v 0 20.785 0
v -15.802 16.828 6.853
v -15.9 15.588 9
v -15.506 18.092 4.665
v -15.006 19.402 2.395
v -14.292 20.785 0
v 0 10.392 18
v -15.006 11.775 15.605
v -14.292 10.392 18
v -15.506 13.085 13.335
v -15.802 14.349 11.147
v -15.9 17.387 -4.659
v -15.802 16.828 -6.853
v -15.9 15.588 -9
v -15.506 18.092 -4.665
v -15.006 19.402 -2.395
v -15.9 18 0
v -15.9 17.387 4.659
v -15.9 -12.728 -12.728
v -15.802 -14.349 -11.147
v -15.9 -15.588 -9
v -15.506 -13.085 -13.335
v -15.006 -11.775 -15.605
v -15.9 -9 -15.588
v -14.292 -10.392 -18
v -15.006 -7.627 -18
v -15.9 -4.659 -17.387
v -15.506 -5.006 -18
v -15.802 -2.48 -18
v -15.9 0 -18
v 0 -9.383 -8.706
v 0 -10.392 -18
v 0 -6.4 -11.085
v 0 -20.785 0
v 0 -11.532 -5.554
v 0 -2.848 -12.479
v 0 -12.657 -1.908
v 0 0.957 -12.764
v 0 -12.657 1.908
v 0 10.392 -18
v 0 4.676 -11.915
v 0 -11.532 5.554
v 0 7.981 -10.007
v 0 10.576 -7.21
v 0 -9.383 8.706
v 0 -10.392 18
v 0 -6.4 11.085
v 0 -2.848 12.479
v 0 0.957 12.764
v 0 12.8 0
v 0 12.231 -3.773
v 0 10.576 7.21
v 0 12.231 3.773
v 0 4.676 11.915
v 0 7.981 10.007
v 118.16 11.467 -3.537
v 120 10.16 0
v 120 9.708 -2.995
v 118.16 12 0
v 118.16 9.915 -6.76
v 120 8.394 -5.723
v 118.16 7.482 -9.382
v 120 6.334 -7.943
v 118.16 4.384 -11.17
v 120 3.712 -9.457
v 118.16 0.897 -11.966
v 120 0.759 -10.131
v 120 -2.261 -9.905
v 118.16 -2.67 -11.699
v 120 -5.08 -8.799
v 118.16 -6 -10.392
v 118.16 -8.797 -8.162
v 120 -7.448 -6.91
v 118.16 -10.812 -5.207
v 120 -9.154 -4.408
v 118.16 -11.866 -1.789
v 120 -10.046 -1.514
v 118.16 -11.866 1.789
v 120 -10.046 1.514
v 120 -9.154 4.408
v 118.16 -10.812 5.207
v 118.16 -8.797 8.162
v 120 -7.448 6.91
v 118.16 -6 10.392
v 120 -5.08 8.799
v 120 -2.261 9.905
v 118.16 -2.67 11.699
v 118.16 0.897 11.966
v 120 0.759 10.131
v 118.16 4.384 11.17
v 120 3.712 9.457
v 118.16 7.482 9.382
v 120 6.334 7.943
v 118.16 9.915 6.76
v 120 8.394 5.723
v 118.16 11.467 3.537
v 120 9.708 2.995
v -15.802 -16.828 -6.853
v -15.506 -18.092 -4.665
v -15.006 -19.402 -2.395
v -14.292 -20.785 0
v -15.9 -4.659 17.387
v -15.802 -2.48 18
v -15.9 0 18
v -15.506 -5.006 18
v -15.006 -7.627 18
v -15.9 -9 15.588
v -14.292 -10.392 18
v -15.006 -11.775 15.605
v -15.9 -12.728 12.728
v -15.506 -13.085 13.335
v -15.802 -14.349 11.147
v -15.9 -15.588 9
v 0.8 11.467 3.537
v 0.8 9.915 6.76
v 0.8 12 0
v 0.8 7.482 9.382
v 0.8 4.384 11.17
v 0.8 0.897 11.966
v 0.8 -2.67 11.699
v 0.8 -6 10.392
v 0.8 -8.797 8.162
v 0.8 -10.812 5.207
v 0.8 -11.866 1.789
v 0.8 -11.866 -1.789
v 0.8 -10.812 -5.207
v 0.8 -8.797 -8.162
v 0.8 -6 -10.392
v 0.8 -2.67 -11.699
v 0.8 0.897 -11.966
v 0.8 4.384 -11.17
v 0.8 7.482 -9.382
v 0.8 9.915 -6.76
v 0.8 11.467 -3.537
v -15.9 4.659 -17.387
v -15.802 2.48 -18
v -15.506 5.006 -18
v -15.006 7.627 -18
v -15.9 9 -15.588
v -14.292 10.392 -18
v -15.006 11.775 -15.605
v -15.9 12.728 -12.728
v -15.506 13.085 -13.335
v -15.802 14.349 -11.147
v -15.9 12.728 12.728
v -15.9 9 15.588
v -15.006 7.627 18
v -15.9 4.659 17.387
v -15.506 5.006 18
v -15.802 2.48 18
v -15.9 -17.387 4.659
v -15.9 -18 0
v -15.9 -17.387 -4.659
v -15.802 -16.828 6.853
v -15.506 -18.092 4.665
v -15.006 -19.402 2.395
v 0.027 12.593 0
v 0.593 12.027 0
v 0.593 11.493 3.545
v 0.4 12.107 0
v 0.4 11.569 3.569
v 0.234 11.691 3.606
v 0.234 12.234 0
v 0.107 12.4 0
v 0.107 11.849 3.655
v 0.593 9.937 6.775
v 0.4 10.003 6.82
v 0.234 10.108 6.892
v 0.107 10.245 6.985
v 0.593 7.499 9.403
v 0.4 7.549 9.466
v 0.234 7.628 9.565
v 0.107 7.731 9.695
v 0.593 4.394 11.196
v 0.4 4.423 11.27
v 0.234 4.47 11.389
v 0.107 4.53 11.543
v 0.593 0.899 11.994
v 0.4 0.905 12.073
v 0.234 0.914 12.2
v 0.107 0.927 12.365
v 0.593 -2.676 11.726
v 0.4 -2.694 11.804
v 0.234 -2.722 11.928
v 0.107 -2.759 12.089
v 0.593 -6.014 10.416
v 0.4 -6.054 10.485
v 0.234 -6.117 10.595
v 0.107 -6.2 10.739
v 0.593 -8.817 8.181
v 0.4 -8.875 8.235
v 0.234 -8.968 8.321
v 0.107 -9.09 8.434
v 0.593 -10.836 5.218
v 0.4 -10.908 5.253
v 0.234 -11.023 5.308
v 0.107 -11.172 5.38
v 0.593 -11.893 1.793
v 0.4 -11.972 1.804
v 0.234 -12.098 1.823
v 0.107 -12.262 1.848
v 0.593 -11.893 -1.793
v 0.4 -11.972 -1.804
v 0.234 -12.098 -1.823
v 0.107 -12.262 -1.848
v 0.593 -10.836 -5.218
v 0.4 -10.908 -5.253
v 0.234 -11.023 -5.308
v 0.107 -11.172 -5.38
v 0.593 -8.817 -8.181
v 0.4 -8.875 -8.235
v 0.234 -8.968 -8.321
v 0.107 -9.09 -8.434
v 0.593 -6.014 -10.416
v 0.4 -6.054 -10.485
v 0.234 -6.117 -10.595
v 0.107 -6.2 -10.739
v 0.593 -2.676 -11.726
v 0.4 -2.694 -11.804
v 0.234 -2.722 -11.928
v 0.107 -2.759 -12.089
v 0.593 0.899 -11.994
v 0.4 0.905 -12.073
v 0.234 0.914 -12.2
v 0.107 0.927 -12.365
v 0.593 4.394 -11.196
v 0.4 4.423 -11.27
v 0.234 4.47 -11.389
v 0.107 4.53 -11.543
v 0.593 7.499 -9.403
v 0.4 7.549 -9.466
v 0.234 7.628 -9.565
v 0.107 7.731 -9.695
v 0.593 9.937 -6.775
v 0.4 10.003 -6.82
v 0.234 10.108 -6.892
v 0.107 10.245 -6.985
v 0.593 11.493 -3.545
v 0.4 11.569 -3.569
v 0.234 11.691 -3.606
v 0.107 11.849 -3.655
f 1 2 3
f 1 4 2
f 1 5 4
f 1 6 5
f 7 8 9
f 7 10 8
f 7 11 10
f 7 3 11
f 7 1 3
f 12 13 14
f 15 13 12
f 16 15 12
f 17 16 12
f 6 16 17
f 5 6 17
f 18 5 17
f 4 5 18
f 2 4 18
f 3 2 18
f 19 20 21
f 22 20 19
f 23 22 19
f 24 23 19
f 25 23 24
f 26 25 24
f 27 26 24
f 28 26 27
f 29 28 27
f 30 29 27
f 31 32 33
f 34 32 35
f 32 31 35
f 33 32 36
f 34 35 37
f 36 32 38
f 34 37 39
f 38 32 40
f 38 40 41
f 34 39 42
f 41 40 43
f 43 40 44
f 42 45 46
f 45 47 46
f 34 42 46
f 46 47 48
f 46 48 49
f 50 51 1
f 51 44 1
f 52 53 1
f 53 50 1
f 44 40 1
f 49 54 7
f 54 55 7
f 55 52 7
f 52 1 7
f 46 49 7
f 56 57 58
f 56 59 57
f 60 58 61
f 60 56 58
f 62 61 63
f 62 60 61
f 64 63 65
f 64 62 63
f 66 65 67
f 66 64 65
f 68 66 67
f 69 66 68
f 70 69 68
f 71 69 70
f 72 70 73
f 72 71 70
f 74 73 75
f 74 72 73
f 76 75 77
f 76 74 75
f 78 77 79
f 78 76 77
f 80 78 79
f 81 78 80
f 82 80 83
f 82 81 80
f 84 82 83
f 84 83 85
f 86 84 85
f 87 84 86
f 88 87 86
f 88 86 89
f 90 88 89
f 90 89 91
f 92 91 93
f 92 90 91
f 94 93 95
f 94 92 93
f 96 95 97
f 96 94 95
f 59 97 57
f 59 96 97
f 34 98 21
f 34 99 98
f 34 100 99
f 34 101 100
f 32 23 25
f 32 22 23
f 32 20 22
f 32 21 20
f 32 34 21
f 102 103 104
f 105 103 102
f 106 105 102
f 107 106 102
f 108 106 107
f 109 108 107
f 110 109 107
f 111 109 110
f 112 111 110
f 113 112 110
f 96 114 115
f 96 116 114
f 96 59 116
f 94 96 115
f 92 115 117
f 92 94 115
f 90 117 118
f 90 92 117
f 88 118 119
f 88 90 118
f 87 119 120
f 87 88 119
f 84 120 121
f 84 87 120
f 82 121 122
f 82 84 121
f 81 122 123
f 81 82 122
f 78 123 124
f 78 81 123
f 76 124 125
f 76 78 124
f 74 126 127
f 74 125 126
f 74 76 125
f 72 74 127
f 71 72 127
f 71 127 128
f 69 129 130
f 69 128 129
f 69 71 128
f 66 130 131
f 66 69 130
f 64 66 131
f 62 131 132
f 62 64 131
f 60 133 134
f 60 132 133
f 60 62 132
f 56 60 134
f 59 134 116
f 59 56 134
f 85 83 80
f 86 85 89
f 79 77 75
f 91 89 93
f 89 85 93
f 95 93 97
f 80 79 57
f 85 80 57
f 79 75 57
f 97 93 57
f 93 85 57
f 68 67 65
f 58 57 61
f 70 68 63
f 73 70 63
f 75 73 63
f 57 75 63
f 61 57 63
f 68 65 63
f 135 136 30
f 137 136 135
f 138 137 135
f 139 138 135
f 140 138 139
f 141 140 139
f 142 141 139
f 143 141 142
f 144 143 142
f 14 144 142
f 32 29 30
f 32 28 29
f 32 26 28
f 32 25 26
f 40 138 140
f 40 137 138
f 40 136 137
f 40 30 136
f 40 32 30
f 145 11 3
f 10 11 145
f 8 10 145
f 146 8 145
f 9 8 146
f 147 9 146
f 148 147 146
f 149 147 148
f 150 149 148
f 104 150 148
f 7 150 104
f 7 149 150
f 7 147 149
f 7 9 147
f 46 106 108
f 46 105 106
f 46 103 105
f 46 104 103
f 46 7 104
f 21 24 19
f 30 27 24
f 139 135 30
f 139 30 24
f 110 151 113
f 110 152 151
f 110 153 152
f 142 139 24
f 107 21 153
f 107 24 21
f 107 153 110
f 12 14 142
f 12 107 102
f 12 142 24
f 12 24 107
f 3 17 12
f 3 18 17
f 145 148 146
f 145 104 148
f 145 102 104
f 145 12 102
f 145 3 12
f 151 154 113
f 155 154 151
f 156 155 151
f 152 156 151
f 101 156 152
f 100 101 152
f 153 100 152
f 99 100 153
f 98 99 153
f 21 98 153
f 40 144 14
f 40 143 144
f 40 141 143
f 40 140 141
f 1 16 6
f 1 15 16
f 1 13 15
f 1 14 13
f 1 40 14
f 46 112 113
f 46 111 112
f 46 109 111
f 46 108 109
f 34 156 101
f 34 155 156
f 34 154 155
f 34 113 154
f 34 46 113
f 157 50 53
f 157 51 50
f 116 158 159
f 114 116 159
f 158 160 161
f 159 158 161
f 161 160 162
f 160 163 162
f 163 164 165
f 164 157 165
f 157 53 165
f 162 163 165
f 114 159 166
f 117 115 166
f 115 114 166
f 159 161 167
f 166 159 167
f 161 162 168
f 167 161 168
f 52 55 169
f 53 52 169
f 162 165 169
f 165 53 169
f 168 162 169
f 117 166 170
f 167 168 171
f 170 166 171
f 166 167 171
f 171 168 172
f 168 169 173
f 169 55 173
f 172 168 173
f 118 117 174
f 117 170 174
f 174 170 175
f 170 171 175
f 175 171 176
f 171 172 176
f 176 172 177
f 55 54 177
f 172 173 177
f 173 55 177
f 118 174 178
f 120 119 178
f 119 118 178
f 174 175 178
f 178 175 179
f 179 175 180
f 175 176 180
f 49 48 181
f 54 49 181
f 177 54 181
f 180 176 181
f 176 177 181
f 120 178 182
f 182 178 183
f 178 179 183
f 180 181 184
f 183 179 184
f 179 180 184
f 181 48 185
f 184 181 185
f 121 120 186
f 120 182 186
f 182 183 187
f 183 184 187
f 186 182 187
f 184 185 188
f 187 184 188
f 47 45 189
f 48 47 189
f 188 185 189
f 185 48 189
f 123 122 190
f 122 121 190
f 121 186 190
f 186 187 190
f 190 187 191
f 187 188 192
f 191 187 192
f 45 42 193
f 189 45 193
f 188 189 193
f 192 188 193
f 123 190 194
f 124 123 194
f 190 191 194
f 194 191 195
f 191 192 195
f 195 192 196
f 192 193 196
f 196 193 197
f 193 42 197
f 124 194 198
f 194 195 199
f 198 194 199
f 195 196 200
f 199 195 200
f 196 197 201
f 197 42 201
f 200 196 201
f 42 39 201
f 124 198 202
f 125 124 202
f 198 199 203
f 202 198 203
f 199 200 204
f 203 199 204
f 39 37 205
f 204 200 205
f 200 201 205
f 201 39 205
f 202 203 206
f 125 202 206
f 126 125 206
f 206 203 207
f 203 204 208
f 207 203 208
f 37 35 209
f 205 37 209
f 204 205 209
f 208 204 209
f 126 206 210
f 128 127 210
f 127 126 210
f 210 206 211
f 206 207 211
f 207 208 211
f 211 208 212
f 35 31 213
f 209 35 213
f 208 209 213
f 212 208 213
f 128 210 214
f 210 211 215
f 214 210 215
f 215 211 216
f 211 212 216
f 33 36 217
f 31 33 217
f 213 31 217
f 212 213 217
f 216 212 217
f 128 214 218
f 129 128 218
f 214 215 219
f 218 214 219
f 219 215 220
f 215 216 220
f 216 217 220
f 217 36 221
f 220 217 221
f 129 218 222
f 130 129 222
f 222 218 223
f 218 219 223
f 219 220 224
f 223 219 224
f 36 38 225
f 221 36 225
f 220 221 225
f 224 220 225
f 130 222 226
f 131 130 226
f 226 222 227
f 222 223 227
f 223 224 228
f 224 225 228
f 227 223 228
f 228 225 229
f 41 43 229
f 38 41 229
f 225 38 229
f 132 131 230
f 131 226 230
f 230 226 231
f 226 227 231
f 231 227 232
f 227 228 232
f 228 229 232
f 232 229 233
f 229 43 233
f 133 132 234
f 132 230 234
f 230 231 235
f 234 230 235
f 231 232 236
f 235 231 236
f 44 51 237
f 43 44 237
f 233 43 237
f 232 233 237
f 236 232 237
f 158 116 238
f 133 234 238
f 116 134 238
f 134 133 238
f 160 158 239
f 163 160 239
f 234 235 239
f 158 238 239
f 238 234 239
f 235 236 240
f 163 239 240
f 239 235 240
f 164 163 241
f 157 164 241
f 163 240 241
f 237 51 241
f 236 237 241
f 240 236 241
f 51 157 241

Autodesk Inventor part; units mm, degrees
ref_plane "YZ Plane" through (0, 0, 0) normal (1, 0, 0) x (0, 1, 0)
ref_plane "XZ Plane" through (0, 0, 0) normal (0, 1, 0) x (-1, 0, 0)
sketch "Sketch1" plane through (0, 0, 0) normal (0, 0, 1) x (1, 0, 0)
  line L0 (0, 12) -> (120, 12)
  line L1 (120, 12) -> (120, 0)
  line L2 (120, 0) -> (0, 0)
  line L3 (-24, 0) -> (144, 0) projected
  line L4 (0, -2.4) -> (0, 14.4) projected
  line L5 (0, 12) -> (0, 0)
  dimension "d2" = 24
  dimension "d59" = 120
revolve "Body" add sketch "Sketch1" angle 360 about axis through (120, 0, 0) along (-1, 0, 0)
sketch "Sketch2" plane through (0, 0, 0) normal (-1, 0, 0) x (0, 0, 1)
  line L0 (0, 20.7846) -> (18, 10.3923)
  line L1 (18, 10.3923) -> (18, -10.3923)
  line L2 (18, -10.3923) -> (0, -20.7846)
  line L3 (0, -20.7846) -> (-18, -10.3923)
  line L4 (-18, -10.3923) -> (-18, 10.3923)
  line L5 (-18, 10.3923) -> (0, 20.7846)
  line L6 (-25.2, 0) -> (25.2, 0) projected
  line L7 (0, 29.0985) -> (0, -29.0985) projected
  point P0 (0, 0)
  point P1 (0, 0)
  dimension "d11" = 36
extrude "Head" add sketch "Sketch2" along normal blind 15.9
sketch "Sketch4" plane through (0, 0, 0) normal (0, 0, 1) x (1, 0, 0)
  line L0 (-13.8215, 21.6) -> (-15.9, 18)
  line L1 (-1.1, 0) -> (-0.234, 0)
  line L2 (-19.0332, 0) -> (2.8992, 0) projected
  line L3 (-15.9, 21.6) -> (-13.8215, 21.6)
  line L4 (-15.9, 18) -> (-15.9, 21.6)
  line L5 (0, 25.92) -> (0, -4.32) projected
  dimension "d65" = 36
  dimension "d67" = 30
  dimension "d68" = 43.2
  dimension "d69" = 15.9
revolve "Chamfer1" cut sketch "Sketch4" angle 360 about axis through (-1.1, 0, 0) along (1, 0, 0)
thread "Thread" size "M24x3" class "6g" standard "ISO Metric profile" length 54
chamfer "Chamfer2" distance 1.8403 distance2 1.8405 1 edges at (120, -12, 0) measured on face at (120, -3.5418, -1.8589)
fillet "Fillet" radius 0.8 1 edges at (0, -12, 0)
ref_plane "Work Plane1" through (1.525, 0, 0) normal (0, 0, 1) x (1, 0, 0)
equation "\"d2\" = GD"
equation "\"d59\" = NLG"
equation "\"d11\" = SW"
equation "\"d3\" = KOH"
equation "\"d15\" = GEL"
equation "\"d6\" = -0.5 * SPD + 0.5 * GD"
equation "\"d71\" = RR1"
equation "\"d65\" = SW"
equation "\"d67\" = ANG1"
equation "\"d68\" = 1.2 * SW"
equation "\"d69\" = KOH"
equation "\"NLG\" = 120"
equation "\"GD\" = NND"
equation "\"BDM\" = NND"
equation "\"KOH\" = 15.9"
equation "\"GEL\" = 54"
equation "\"SW\" = 36"
equation "\"SW0\" = SW"
equation "\"SPD\" = NND - 1.2269 * PTC"
equation "\"SD2\" = NND"
equation "\"SD\" = 0"
equation "\"ANG1\" = 30deg"
equation "\"GAL\" = 0.61345 * PTC"
equation "\"GUL\" = 0.61345 * PTC"
equation "\"RR\" = 0.1"
equation "\"RR1\" = 0.8"
equation "\"GD1\" = THREADDIA - 1.2269 * PTC"
equation "\"THREADDIA\" = 24"
equation "\"TOA\" = 30deg"
equation "\"PTC\" = 3"
equation "\"KOH1\" = 10.5"
equation "\"NND\" = 24"
equation "\"E0\" = 1.155 * SW"
properties part number "ANSI B18.2.3.5M - M24 x 3 x 120" material "Steel, Mild"
